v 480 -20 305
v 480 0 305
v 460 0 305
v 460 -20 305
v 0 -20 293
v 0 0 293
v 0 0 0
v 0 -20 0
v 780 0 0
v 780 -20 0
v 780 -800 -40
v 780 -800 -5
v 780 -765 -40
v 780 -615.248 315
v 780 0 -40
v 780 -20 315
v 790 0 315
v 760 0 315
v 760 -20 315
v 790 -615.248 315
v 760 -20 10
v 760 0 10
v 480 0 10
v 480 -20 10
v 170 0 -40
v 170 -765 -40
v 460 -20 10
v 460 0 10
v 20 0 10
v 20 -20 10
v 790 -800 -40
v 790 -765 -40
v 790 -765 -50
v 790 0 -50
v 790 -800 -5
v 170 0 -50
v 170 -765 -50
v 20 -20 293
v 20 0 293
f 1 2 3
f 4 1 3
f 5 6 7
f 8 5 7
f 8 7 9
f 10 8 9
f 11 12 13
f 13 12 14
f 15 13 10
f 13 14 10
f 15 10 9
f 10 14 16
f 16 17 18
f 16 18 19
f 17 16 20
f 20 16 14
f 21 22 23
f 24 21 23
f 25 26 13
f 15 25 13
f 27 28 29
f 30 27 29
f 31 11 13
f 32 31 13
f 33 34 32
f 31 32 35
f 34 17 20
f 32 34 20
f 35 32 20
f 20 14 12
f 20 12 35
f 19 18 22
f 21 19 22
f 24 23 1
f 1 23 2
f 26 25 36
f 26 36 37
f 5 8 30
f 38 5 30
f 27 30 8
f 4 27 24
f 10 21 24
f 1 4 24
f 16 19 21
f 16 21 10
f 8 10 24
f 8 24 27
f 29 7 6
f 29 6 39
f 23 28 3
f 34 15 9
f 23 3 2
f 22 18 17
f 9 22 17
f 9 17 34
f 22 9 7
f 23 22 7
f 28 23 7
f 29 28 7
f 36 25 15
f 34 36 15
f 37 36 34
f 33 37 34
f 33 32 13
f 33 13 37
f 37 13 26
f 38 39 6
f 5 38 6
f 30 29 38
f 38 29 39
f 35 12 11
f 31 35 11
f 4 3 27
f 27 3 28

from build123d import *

# Parameters (mm, degrees)
F1_DEPTH = 20
F2_W     = 20
F2_H     = 315
F3_DEPTH = 10
F4_SIZE2 = 184.7520861407
F4_SIZE  = 320
F5_W     = 610
F5_H     = 765
F5_W_2   = 10
F6_DEPTH = 10


with BuildPart() as f1:
    # F0 (on Front) → F1 (new body)
    with BuildSketch(Plane.XZ):
        Polygon((0, 293), (0, 0), (780, 0), (780, 315), (760, 315), (760, 10), (480, 10), (480, 305), (460, 305), (460, 10), (20, 10), (20, 293), align=None)
    extrude(amount=F1_DEPTH)

    # F2 (on face) → F3 (join)
    with BuildSketch(Plane.YZ.offset(780)):
        Polygon((-20, 0), (-20, 315), (-800, 315), (-800, -40), (0, -40), (0, 0), align=None)
        with Locations((-10, 157.5)):
            Rectangle(F2_W, F2_H)
    extrude(amount=F3_DEPTH)

    # F4
    f4_edges = [f1.edges().sort_by_distance(p)[0] for p in [
        (785, -800, 315),
    ]]
    f4_side = f1.faces().sort_by_distance((785, -800, 137.5))[0]
    chamfer(f4_edges, length=F4_SIZE, length2=F4_SIZE2, reference=f4_side)

    # F5 (on face) → F6 (join)
    with BuildSketch(Plane(origin=(0, 0, -40), x_dir=(1, 0, 0), z_dir=(0, 0, -1))):
        with Locations((475, 382.5)):
            Rectangle(F5_W, F5_H)
        with Locations((785, 382.5)):
            Rectangle(F5_W_2, F5_H)
    extrude(amount=F6_DEPTH)


solid = f1.part
